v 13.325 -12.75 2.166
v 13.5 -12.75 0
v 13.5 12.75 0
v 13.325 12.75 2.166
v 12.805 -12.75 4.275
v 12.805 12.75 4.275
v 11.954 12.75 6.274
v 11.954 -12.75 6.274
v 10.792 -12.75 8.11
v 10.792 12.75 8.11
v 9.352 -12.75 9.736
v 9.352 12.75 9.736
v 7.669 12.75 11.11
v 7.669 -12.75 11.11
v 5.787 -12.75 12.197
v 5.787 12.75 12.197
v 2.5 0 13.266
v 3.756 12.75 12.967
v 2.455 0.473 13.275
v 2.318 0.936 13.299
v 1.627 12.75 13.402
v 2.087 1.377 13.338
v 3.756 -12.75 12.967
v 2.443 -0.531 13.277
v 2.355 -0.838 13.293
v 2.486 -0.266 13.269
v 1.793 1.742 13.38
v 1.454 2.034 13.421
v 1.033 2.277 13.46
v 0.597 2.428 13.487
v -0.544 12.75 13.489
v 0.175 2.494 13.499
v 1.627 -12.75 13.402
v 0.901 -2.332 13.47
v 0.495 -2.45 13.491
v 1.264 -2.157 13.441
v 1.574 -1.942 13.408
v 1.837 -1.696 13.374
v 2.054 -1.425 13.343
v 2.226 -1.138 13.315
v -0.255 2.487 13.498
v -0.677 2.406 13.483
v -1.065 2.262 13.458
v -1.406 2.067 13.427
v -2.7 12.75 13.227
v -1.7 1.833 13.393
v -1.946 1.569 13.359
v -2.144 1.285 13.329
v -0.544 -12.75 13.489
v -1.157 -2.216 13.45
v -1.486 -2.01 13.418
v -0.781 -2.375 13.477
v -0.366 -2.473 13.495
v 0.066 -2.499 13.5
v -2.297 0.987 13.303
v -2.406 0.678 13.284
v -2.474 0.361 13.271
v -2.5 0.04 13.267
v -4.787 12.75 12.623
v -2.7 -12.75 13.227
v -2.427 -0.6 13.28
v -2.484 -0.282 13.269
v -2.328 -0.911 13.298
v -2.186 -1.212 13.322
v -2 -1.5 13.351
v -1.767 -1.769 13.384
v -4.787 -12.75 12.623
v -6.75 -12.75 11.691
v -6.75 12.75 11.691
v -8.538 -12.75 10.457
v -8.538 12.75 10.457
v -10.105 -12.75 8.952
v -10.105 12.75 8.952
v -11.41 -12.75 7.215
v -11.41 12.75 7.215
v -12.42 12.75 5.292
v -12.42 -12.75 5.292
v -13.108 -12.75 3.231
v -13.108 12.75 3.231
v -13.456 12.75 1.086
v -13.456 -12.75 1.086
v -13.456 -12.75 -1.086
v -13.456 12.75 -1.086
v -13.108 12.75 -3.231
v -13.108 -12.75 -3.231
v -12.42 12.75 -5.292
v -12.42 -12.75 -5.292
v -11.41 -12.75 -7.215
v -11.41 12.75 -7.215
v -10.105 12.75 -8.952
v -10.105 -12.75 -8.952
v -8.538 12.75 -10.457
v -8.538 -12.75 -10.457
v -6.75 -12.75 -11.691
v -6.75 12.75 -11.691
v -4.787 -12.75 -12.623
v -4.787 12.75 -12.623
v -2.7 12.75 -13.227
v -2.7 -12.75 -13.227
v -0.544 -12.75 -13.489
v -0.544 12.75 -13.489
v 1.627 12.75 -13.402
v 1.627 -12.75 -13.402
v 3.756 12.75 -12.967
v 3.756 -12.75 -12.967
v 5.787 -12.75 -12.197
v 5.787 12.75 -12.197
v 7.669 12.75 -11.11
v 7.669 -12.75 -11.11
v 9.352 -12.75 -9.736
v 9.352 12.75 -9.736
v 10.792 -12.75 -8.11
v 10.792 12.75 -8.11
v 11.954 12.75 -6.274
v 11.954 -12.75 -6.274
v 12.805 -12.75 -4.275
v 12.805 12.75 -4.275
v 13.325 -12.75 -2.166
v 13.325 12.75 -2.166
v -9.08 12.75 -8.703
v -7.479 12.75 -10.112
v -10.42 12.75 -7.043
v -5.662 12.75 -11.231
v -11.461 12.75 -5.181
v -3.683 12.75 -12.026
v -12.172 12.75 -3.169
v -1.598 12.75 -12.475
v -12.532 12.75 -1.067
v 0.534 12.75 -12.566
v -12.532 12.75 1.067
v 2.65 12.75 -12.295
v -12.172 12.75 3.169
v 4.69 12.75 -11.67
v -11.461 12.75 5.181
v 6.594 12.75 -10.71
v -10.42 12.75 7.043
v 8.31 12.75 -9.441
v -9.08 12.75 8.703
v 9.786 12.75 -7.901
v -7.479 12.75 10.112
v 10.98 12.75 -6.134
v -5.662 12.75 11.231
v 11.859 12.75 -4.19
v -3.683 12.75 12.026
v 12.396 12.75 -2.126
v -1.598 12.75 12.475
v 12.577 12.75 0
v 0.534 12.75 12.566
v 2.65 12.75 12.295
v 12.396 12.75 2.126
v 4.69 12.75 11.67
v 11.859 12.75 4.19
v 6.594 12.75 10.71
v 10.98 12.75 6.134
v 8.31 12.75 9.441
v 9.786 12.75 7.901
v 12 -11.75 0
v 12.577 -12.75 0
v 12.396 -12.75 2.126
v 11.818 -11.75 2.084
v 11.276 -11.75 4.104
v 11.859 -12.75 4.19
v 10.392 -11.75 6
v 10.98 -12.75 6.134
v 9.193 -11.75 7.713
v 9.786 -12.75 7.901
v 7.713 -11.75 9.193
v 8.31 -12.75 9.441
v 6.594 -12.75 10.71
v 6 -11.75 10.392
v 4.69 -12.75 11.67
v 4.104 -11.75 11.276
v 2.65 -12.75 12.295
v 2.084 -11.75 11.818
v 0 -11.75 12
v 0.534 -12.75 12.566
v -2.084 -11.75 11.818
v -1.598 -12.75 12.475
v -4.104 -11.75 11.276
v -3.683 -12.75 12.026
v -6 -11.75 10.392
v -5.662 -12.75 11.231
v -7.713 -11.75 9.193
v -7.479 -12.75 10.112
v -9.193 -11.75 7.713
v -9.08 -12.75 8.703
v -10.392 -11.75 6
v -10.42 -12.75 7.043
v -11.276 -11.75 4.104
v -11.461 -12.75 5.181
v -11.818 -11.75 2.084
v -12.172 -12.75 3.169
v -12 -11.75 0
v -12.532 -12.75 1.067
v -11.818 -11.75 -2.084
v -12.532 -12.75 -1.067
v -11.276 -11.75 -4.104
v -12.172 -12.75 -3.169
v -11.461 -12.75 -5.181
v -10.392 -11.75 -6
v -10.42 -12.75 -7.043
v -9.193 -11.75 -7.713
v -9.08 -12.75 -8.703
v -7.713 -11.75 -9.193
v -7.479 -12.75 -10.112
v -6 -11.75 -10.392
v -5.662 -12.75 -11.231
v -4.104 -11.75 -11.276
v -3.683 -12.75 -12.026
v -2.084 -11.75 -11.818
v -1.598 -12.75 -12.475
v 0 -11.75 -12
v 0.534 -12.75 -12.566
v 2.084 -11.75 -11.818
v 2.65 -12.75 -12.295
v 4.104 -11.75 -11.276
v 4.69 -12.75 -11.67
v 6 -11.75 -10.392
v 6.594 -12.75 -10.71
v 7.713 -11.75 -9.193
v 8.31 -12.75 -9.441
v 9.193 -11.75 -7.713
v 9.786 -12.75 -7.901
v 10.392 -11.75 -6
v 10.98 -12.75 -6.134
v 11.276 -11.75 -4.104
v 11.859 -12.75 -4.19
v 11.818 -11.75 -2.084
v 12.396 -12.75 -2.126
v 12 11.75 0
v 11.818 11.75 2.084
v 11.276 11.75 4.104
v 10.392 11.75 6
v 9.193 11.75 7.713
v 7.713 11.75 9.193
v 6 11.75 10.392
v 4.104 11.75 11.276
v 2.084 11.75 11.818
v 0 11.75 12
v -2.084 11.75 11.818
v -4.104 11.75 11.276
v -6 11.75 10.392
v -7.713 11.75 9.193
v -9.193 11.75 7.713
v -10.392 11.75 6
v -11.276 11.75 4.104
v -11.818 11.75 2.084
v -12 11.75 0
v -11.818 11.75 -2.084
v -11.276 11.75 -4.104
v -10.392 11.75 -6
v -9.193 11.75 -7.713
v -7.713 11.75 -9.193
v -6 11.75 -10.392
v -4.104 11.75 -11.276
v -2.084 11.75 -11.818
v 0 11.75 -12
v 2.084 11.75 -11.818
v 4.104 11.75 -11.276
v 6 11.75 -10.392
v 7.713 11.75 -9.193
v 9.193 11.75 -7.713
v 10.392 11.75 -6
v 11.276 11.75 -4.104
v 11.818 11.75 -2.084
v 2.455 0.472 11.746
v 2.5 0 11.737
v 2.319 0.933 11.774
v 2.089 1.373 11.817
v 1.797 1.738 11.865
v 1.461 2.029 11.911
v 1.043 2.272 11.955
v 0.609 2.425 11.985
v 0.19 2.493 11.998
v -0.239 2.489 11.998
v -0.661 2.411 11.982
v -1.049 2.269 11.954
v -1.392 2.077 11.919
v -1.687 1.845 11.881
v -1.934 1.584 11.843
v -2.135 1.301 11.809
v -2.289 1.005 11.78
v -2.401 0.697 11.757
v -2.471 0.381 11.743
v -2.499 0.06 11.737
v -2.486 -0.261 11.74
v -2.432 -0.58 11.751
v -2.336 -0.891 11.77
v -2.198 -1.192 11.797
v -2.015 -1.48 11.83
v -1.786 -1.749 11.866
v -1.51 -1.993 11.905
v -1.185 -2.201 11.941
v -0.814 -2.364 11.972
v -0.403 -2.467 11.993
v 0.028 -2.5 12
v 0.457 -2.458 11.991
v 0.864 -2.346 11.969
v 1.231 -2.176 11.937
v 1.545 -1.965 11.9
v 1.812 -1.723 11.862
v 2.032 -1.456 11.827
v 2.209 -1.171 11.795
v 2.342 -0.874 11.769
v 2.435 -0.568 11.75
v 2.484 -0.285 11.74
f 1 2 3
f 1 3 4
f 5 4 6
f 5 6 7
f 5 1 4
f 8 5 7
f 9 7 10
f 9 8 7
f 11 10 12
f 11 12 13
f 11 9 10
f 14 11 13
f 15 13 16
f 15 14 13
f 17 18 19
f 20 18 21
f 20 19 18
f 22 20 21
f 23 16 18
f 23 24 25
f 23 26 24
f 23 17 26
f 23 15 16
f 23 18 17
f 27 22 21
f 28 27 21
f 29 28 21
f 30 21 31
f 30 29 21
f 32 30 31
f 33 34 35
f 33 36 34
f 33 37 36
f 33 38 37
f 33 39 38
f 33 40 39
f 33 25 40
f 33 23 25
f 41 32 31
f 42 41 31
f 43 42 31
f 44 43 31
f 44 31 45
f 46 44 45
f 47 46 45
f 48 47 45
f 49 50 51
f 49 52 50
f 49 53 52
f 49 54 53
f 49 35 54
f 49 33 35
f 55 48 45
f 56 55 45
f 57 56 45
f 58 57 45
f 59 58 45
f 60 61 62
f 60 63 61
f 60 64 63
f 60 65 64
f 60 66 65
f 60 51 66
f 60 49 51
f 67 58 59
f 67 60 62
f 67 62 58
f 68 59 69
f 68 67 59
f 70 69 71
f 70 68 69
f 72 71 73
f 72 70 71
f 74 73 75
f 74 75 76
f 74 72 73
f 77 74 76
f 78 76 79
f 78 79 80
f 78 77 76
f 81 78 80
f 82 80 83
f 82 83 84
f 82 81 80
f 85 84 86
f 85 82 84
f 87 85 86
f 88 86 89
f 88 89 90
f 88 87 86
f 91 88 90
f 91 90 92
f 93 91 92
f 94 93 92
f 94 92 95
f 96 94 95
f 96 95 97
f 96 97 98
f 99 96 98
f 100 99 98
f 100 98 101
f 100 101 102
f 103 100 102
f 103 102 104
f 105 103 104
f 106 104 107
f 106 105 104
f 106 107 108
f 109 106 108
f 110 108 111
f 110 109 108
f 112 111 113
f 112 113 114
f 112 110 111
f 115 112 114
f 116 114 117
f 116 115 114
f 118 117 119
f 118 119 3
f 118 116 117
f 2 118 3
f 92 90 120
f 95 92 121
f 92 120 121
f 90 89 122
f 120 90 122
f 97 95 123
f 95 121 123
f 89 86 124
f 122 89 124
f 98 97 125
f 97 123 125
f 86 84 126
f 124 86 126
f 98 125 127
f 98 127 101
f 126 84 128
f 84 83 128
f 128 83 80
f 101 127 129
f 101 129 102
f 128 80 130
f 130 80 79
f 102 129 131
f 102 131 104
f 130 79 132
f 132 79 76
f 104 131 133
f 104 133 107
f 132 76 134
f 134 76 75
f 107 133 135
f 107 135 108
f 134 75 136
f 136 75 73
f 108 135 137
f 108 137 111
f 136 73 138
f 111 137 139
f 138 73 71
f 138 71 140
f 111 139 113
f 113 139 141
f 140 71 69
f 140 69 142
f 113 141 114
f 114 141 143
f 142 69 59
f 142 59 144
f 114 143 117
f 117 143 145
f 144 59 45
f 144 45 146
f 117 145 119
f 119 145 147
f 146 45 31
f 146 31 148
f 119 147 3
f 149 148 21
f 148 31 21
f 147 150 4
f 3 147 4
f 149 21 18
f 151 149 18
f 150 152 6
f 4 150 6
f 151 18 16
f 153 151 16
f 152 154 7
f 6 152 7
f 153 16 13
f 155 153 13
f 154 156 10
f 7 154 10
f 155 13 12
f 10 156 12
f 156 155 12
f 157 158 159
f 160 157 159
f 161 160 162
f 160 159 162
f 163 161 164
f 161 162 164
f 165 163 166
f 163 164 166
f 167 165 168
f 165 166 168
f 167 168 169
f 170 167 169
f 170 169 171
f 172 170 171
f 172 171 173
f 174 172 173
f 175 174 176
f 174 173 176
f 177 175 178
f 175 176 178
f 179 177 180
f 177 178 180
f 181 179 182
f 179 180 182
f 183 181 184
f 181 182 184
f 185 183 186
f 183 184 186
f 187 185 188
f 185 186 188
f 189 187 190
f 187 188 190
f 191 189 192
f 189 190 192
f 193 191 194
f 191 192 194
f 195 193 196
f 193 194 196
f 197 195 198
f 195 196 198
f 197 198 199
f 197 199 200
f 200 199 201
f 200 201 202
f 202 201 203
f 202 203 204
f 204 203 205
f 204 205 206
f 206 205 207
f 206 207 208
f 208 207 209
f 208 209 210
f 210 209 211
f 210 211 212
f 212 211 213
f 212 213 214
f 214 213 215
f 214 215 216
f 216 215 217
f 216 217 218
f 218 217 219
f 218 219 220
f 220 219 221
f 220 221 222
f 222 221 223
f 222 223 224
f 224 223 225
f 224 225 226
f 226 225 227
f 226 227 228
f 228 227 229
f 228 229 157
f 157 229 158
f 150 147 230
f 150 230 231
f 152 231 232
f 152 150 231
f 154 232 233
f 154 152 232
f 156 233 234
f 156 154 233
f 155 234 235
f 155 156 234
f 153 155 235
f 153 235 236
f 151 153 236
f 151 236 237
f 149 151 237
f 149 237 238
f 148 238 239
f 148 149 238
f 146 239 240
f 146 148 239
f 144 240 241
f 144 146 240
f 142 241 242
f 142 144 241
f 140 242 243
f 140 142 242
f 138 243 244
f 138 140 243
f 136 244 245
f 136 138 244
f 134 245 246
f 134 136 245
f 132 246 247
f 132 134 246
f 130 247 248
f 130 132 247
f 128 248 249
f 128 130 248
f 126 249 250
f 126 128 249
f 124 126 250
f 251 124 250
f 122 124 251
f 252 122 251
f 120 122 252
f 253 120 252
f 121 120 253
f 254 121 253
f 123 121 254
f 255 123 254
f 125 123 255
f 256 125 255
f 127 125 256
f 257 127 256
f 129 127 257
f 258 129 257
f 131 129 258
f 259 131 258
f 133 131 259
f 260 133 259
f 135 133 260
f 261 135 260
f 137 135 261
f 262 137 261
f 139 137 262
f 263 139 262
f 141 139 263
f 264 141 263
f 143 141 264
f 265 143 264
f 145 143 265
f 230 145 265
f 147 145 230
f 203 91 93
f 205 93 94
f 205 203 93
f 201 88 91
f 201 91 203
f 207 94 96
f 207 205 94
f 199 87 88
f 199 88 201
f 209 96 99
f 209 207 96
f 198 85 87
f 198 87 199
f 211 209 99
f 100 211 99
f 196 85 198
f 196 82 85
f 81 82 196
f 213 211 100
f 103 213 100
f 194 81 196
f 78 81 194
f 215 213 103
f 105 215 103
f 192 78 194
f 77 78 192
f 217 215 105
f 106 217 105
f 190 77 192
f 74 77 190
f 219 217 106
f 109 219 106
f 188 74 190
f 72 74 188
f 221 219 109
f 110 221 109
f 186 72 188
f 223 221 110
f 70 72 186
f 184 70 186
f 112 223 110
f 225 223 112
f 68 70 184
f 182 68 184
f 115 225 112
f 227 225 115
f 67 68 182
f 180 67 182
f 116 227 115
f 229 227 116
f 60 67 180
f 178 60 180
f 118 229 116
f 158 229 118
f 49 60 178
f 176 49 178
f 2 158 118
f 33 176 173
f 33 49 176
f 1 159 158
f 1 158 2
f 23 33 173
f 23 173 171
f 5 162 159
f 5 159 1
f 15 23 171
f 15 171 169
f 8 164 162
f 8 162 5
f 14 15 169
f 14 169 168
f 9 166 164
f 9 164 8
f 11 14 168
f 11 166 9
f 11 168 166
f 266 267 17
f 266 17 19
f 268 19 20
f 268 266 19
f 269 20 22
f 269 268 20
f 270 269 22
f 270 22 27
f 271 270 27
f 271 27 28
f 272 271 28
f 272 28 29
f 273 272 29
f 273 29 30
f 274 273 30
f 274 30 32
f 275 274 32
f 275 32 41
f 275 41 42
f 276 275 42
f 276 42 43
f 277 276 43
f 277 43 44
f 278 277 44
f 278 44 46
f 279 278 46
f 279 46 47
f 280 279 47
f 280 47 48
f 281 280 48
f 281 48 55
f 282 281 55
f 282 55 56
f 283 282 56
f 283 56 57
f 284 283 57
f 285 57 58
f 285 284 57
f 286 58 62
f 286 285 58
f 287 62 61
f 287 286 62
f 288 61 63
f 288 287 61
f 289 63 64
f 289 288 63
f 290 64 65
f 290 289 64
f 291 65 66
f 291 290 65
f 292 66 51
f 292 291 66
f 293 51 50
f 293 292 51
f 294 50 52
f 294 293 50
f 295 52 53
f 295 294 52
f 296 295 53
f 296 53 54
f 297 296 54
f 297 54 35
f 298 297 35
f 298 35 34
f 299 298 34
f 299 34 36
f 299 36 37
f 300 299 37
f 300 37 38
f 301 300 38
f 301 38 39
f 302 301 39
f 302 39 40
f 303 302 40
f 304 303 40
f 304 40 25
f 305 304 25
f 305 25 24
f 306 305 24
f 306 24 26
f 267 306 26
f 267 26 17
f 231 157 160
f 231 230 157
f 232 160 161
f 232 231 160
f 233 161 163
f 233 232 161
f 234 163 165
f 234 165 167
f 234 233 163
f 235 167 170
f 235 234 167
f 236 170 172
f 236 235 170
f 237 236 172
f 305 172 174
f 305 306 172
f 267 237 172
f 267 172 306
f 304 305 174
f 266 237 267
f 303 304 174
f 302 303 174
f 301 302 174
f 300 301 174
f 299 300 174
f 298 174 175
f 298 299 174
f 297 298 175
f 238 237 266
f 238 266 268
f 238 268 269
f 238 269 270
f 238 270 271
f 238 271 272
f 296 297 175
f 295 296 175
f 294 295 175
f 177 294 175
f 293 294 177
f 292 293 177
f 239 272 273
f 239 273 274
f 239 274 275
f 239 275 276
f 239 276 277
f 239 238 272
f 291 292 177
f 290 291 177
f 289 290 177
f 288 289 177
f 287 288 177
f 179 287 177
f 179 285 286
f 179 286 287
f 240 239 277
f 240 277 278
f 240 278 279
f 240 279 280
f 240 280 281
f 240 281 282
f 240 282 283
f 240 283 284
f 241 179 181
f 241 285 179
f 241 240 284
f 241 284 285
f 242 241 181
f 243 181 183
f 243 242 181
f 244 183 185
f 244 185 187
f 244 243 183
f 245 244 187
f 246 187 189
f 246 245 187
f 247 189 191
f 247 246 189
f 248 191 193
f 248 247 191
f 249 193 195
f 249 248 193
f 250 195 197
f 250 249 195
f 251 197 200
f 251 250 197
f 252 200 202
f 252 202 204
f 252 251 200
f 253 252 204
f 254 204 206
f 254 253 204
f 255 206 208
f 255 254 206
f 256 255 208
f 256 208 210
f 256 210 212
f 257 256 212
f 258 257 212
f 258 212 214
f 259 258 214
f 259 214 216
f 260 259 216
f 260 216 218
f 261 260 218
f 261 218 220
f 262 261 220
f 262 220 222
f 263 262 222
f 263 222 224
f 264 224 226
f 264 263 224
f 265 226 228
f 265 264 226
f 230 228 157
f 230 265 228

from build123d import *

# Parameters (mm, degrees)
F0_R     = 13.5
F0_R_2   = 12
F1_DEPTH = 12.75
F2_SIZE2 = 0.5773502692
F2_SIZE  = 1
F3_R     = 2.5
F4_DEPTH = 13.501


with BuildPart() as f1:
    # F0 (on Front) → F1 (new body, symmetric)
    with BuildSketch(Plane.XZ):
        Circle(F0_R)
        Circle(F0_R_2, mode=Mode.SUBTRACT)
    extrude(amount=F1_DEPTH, both=True)

    # F2
    f2_edges = [f1.edges().sort_by_distance(p)[0] for p in [
        (-12, -12.75, 0),
        (-12, 12.75, 0),
    ]]
    f2_side = f1.faces().sort_by_distance((-12, 0, 0))[0]
    chamfer(f2_edges, length=F2_SIZE, length2=F2_SIZE2, reference=f2_side)

    # F3 (on Top) → F4 (cut, through all)
    with BuildSketch(Plane.XY):
        Circle(F3_R)
    extrude(amount=F4_DEPTH, mode=Mode.SUBTRACT)


solid = f1.part
